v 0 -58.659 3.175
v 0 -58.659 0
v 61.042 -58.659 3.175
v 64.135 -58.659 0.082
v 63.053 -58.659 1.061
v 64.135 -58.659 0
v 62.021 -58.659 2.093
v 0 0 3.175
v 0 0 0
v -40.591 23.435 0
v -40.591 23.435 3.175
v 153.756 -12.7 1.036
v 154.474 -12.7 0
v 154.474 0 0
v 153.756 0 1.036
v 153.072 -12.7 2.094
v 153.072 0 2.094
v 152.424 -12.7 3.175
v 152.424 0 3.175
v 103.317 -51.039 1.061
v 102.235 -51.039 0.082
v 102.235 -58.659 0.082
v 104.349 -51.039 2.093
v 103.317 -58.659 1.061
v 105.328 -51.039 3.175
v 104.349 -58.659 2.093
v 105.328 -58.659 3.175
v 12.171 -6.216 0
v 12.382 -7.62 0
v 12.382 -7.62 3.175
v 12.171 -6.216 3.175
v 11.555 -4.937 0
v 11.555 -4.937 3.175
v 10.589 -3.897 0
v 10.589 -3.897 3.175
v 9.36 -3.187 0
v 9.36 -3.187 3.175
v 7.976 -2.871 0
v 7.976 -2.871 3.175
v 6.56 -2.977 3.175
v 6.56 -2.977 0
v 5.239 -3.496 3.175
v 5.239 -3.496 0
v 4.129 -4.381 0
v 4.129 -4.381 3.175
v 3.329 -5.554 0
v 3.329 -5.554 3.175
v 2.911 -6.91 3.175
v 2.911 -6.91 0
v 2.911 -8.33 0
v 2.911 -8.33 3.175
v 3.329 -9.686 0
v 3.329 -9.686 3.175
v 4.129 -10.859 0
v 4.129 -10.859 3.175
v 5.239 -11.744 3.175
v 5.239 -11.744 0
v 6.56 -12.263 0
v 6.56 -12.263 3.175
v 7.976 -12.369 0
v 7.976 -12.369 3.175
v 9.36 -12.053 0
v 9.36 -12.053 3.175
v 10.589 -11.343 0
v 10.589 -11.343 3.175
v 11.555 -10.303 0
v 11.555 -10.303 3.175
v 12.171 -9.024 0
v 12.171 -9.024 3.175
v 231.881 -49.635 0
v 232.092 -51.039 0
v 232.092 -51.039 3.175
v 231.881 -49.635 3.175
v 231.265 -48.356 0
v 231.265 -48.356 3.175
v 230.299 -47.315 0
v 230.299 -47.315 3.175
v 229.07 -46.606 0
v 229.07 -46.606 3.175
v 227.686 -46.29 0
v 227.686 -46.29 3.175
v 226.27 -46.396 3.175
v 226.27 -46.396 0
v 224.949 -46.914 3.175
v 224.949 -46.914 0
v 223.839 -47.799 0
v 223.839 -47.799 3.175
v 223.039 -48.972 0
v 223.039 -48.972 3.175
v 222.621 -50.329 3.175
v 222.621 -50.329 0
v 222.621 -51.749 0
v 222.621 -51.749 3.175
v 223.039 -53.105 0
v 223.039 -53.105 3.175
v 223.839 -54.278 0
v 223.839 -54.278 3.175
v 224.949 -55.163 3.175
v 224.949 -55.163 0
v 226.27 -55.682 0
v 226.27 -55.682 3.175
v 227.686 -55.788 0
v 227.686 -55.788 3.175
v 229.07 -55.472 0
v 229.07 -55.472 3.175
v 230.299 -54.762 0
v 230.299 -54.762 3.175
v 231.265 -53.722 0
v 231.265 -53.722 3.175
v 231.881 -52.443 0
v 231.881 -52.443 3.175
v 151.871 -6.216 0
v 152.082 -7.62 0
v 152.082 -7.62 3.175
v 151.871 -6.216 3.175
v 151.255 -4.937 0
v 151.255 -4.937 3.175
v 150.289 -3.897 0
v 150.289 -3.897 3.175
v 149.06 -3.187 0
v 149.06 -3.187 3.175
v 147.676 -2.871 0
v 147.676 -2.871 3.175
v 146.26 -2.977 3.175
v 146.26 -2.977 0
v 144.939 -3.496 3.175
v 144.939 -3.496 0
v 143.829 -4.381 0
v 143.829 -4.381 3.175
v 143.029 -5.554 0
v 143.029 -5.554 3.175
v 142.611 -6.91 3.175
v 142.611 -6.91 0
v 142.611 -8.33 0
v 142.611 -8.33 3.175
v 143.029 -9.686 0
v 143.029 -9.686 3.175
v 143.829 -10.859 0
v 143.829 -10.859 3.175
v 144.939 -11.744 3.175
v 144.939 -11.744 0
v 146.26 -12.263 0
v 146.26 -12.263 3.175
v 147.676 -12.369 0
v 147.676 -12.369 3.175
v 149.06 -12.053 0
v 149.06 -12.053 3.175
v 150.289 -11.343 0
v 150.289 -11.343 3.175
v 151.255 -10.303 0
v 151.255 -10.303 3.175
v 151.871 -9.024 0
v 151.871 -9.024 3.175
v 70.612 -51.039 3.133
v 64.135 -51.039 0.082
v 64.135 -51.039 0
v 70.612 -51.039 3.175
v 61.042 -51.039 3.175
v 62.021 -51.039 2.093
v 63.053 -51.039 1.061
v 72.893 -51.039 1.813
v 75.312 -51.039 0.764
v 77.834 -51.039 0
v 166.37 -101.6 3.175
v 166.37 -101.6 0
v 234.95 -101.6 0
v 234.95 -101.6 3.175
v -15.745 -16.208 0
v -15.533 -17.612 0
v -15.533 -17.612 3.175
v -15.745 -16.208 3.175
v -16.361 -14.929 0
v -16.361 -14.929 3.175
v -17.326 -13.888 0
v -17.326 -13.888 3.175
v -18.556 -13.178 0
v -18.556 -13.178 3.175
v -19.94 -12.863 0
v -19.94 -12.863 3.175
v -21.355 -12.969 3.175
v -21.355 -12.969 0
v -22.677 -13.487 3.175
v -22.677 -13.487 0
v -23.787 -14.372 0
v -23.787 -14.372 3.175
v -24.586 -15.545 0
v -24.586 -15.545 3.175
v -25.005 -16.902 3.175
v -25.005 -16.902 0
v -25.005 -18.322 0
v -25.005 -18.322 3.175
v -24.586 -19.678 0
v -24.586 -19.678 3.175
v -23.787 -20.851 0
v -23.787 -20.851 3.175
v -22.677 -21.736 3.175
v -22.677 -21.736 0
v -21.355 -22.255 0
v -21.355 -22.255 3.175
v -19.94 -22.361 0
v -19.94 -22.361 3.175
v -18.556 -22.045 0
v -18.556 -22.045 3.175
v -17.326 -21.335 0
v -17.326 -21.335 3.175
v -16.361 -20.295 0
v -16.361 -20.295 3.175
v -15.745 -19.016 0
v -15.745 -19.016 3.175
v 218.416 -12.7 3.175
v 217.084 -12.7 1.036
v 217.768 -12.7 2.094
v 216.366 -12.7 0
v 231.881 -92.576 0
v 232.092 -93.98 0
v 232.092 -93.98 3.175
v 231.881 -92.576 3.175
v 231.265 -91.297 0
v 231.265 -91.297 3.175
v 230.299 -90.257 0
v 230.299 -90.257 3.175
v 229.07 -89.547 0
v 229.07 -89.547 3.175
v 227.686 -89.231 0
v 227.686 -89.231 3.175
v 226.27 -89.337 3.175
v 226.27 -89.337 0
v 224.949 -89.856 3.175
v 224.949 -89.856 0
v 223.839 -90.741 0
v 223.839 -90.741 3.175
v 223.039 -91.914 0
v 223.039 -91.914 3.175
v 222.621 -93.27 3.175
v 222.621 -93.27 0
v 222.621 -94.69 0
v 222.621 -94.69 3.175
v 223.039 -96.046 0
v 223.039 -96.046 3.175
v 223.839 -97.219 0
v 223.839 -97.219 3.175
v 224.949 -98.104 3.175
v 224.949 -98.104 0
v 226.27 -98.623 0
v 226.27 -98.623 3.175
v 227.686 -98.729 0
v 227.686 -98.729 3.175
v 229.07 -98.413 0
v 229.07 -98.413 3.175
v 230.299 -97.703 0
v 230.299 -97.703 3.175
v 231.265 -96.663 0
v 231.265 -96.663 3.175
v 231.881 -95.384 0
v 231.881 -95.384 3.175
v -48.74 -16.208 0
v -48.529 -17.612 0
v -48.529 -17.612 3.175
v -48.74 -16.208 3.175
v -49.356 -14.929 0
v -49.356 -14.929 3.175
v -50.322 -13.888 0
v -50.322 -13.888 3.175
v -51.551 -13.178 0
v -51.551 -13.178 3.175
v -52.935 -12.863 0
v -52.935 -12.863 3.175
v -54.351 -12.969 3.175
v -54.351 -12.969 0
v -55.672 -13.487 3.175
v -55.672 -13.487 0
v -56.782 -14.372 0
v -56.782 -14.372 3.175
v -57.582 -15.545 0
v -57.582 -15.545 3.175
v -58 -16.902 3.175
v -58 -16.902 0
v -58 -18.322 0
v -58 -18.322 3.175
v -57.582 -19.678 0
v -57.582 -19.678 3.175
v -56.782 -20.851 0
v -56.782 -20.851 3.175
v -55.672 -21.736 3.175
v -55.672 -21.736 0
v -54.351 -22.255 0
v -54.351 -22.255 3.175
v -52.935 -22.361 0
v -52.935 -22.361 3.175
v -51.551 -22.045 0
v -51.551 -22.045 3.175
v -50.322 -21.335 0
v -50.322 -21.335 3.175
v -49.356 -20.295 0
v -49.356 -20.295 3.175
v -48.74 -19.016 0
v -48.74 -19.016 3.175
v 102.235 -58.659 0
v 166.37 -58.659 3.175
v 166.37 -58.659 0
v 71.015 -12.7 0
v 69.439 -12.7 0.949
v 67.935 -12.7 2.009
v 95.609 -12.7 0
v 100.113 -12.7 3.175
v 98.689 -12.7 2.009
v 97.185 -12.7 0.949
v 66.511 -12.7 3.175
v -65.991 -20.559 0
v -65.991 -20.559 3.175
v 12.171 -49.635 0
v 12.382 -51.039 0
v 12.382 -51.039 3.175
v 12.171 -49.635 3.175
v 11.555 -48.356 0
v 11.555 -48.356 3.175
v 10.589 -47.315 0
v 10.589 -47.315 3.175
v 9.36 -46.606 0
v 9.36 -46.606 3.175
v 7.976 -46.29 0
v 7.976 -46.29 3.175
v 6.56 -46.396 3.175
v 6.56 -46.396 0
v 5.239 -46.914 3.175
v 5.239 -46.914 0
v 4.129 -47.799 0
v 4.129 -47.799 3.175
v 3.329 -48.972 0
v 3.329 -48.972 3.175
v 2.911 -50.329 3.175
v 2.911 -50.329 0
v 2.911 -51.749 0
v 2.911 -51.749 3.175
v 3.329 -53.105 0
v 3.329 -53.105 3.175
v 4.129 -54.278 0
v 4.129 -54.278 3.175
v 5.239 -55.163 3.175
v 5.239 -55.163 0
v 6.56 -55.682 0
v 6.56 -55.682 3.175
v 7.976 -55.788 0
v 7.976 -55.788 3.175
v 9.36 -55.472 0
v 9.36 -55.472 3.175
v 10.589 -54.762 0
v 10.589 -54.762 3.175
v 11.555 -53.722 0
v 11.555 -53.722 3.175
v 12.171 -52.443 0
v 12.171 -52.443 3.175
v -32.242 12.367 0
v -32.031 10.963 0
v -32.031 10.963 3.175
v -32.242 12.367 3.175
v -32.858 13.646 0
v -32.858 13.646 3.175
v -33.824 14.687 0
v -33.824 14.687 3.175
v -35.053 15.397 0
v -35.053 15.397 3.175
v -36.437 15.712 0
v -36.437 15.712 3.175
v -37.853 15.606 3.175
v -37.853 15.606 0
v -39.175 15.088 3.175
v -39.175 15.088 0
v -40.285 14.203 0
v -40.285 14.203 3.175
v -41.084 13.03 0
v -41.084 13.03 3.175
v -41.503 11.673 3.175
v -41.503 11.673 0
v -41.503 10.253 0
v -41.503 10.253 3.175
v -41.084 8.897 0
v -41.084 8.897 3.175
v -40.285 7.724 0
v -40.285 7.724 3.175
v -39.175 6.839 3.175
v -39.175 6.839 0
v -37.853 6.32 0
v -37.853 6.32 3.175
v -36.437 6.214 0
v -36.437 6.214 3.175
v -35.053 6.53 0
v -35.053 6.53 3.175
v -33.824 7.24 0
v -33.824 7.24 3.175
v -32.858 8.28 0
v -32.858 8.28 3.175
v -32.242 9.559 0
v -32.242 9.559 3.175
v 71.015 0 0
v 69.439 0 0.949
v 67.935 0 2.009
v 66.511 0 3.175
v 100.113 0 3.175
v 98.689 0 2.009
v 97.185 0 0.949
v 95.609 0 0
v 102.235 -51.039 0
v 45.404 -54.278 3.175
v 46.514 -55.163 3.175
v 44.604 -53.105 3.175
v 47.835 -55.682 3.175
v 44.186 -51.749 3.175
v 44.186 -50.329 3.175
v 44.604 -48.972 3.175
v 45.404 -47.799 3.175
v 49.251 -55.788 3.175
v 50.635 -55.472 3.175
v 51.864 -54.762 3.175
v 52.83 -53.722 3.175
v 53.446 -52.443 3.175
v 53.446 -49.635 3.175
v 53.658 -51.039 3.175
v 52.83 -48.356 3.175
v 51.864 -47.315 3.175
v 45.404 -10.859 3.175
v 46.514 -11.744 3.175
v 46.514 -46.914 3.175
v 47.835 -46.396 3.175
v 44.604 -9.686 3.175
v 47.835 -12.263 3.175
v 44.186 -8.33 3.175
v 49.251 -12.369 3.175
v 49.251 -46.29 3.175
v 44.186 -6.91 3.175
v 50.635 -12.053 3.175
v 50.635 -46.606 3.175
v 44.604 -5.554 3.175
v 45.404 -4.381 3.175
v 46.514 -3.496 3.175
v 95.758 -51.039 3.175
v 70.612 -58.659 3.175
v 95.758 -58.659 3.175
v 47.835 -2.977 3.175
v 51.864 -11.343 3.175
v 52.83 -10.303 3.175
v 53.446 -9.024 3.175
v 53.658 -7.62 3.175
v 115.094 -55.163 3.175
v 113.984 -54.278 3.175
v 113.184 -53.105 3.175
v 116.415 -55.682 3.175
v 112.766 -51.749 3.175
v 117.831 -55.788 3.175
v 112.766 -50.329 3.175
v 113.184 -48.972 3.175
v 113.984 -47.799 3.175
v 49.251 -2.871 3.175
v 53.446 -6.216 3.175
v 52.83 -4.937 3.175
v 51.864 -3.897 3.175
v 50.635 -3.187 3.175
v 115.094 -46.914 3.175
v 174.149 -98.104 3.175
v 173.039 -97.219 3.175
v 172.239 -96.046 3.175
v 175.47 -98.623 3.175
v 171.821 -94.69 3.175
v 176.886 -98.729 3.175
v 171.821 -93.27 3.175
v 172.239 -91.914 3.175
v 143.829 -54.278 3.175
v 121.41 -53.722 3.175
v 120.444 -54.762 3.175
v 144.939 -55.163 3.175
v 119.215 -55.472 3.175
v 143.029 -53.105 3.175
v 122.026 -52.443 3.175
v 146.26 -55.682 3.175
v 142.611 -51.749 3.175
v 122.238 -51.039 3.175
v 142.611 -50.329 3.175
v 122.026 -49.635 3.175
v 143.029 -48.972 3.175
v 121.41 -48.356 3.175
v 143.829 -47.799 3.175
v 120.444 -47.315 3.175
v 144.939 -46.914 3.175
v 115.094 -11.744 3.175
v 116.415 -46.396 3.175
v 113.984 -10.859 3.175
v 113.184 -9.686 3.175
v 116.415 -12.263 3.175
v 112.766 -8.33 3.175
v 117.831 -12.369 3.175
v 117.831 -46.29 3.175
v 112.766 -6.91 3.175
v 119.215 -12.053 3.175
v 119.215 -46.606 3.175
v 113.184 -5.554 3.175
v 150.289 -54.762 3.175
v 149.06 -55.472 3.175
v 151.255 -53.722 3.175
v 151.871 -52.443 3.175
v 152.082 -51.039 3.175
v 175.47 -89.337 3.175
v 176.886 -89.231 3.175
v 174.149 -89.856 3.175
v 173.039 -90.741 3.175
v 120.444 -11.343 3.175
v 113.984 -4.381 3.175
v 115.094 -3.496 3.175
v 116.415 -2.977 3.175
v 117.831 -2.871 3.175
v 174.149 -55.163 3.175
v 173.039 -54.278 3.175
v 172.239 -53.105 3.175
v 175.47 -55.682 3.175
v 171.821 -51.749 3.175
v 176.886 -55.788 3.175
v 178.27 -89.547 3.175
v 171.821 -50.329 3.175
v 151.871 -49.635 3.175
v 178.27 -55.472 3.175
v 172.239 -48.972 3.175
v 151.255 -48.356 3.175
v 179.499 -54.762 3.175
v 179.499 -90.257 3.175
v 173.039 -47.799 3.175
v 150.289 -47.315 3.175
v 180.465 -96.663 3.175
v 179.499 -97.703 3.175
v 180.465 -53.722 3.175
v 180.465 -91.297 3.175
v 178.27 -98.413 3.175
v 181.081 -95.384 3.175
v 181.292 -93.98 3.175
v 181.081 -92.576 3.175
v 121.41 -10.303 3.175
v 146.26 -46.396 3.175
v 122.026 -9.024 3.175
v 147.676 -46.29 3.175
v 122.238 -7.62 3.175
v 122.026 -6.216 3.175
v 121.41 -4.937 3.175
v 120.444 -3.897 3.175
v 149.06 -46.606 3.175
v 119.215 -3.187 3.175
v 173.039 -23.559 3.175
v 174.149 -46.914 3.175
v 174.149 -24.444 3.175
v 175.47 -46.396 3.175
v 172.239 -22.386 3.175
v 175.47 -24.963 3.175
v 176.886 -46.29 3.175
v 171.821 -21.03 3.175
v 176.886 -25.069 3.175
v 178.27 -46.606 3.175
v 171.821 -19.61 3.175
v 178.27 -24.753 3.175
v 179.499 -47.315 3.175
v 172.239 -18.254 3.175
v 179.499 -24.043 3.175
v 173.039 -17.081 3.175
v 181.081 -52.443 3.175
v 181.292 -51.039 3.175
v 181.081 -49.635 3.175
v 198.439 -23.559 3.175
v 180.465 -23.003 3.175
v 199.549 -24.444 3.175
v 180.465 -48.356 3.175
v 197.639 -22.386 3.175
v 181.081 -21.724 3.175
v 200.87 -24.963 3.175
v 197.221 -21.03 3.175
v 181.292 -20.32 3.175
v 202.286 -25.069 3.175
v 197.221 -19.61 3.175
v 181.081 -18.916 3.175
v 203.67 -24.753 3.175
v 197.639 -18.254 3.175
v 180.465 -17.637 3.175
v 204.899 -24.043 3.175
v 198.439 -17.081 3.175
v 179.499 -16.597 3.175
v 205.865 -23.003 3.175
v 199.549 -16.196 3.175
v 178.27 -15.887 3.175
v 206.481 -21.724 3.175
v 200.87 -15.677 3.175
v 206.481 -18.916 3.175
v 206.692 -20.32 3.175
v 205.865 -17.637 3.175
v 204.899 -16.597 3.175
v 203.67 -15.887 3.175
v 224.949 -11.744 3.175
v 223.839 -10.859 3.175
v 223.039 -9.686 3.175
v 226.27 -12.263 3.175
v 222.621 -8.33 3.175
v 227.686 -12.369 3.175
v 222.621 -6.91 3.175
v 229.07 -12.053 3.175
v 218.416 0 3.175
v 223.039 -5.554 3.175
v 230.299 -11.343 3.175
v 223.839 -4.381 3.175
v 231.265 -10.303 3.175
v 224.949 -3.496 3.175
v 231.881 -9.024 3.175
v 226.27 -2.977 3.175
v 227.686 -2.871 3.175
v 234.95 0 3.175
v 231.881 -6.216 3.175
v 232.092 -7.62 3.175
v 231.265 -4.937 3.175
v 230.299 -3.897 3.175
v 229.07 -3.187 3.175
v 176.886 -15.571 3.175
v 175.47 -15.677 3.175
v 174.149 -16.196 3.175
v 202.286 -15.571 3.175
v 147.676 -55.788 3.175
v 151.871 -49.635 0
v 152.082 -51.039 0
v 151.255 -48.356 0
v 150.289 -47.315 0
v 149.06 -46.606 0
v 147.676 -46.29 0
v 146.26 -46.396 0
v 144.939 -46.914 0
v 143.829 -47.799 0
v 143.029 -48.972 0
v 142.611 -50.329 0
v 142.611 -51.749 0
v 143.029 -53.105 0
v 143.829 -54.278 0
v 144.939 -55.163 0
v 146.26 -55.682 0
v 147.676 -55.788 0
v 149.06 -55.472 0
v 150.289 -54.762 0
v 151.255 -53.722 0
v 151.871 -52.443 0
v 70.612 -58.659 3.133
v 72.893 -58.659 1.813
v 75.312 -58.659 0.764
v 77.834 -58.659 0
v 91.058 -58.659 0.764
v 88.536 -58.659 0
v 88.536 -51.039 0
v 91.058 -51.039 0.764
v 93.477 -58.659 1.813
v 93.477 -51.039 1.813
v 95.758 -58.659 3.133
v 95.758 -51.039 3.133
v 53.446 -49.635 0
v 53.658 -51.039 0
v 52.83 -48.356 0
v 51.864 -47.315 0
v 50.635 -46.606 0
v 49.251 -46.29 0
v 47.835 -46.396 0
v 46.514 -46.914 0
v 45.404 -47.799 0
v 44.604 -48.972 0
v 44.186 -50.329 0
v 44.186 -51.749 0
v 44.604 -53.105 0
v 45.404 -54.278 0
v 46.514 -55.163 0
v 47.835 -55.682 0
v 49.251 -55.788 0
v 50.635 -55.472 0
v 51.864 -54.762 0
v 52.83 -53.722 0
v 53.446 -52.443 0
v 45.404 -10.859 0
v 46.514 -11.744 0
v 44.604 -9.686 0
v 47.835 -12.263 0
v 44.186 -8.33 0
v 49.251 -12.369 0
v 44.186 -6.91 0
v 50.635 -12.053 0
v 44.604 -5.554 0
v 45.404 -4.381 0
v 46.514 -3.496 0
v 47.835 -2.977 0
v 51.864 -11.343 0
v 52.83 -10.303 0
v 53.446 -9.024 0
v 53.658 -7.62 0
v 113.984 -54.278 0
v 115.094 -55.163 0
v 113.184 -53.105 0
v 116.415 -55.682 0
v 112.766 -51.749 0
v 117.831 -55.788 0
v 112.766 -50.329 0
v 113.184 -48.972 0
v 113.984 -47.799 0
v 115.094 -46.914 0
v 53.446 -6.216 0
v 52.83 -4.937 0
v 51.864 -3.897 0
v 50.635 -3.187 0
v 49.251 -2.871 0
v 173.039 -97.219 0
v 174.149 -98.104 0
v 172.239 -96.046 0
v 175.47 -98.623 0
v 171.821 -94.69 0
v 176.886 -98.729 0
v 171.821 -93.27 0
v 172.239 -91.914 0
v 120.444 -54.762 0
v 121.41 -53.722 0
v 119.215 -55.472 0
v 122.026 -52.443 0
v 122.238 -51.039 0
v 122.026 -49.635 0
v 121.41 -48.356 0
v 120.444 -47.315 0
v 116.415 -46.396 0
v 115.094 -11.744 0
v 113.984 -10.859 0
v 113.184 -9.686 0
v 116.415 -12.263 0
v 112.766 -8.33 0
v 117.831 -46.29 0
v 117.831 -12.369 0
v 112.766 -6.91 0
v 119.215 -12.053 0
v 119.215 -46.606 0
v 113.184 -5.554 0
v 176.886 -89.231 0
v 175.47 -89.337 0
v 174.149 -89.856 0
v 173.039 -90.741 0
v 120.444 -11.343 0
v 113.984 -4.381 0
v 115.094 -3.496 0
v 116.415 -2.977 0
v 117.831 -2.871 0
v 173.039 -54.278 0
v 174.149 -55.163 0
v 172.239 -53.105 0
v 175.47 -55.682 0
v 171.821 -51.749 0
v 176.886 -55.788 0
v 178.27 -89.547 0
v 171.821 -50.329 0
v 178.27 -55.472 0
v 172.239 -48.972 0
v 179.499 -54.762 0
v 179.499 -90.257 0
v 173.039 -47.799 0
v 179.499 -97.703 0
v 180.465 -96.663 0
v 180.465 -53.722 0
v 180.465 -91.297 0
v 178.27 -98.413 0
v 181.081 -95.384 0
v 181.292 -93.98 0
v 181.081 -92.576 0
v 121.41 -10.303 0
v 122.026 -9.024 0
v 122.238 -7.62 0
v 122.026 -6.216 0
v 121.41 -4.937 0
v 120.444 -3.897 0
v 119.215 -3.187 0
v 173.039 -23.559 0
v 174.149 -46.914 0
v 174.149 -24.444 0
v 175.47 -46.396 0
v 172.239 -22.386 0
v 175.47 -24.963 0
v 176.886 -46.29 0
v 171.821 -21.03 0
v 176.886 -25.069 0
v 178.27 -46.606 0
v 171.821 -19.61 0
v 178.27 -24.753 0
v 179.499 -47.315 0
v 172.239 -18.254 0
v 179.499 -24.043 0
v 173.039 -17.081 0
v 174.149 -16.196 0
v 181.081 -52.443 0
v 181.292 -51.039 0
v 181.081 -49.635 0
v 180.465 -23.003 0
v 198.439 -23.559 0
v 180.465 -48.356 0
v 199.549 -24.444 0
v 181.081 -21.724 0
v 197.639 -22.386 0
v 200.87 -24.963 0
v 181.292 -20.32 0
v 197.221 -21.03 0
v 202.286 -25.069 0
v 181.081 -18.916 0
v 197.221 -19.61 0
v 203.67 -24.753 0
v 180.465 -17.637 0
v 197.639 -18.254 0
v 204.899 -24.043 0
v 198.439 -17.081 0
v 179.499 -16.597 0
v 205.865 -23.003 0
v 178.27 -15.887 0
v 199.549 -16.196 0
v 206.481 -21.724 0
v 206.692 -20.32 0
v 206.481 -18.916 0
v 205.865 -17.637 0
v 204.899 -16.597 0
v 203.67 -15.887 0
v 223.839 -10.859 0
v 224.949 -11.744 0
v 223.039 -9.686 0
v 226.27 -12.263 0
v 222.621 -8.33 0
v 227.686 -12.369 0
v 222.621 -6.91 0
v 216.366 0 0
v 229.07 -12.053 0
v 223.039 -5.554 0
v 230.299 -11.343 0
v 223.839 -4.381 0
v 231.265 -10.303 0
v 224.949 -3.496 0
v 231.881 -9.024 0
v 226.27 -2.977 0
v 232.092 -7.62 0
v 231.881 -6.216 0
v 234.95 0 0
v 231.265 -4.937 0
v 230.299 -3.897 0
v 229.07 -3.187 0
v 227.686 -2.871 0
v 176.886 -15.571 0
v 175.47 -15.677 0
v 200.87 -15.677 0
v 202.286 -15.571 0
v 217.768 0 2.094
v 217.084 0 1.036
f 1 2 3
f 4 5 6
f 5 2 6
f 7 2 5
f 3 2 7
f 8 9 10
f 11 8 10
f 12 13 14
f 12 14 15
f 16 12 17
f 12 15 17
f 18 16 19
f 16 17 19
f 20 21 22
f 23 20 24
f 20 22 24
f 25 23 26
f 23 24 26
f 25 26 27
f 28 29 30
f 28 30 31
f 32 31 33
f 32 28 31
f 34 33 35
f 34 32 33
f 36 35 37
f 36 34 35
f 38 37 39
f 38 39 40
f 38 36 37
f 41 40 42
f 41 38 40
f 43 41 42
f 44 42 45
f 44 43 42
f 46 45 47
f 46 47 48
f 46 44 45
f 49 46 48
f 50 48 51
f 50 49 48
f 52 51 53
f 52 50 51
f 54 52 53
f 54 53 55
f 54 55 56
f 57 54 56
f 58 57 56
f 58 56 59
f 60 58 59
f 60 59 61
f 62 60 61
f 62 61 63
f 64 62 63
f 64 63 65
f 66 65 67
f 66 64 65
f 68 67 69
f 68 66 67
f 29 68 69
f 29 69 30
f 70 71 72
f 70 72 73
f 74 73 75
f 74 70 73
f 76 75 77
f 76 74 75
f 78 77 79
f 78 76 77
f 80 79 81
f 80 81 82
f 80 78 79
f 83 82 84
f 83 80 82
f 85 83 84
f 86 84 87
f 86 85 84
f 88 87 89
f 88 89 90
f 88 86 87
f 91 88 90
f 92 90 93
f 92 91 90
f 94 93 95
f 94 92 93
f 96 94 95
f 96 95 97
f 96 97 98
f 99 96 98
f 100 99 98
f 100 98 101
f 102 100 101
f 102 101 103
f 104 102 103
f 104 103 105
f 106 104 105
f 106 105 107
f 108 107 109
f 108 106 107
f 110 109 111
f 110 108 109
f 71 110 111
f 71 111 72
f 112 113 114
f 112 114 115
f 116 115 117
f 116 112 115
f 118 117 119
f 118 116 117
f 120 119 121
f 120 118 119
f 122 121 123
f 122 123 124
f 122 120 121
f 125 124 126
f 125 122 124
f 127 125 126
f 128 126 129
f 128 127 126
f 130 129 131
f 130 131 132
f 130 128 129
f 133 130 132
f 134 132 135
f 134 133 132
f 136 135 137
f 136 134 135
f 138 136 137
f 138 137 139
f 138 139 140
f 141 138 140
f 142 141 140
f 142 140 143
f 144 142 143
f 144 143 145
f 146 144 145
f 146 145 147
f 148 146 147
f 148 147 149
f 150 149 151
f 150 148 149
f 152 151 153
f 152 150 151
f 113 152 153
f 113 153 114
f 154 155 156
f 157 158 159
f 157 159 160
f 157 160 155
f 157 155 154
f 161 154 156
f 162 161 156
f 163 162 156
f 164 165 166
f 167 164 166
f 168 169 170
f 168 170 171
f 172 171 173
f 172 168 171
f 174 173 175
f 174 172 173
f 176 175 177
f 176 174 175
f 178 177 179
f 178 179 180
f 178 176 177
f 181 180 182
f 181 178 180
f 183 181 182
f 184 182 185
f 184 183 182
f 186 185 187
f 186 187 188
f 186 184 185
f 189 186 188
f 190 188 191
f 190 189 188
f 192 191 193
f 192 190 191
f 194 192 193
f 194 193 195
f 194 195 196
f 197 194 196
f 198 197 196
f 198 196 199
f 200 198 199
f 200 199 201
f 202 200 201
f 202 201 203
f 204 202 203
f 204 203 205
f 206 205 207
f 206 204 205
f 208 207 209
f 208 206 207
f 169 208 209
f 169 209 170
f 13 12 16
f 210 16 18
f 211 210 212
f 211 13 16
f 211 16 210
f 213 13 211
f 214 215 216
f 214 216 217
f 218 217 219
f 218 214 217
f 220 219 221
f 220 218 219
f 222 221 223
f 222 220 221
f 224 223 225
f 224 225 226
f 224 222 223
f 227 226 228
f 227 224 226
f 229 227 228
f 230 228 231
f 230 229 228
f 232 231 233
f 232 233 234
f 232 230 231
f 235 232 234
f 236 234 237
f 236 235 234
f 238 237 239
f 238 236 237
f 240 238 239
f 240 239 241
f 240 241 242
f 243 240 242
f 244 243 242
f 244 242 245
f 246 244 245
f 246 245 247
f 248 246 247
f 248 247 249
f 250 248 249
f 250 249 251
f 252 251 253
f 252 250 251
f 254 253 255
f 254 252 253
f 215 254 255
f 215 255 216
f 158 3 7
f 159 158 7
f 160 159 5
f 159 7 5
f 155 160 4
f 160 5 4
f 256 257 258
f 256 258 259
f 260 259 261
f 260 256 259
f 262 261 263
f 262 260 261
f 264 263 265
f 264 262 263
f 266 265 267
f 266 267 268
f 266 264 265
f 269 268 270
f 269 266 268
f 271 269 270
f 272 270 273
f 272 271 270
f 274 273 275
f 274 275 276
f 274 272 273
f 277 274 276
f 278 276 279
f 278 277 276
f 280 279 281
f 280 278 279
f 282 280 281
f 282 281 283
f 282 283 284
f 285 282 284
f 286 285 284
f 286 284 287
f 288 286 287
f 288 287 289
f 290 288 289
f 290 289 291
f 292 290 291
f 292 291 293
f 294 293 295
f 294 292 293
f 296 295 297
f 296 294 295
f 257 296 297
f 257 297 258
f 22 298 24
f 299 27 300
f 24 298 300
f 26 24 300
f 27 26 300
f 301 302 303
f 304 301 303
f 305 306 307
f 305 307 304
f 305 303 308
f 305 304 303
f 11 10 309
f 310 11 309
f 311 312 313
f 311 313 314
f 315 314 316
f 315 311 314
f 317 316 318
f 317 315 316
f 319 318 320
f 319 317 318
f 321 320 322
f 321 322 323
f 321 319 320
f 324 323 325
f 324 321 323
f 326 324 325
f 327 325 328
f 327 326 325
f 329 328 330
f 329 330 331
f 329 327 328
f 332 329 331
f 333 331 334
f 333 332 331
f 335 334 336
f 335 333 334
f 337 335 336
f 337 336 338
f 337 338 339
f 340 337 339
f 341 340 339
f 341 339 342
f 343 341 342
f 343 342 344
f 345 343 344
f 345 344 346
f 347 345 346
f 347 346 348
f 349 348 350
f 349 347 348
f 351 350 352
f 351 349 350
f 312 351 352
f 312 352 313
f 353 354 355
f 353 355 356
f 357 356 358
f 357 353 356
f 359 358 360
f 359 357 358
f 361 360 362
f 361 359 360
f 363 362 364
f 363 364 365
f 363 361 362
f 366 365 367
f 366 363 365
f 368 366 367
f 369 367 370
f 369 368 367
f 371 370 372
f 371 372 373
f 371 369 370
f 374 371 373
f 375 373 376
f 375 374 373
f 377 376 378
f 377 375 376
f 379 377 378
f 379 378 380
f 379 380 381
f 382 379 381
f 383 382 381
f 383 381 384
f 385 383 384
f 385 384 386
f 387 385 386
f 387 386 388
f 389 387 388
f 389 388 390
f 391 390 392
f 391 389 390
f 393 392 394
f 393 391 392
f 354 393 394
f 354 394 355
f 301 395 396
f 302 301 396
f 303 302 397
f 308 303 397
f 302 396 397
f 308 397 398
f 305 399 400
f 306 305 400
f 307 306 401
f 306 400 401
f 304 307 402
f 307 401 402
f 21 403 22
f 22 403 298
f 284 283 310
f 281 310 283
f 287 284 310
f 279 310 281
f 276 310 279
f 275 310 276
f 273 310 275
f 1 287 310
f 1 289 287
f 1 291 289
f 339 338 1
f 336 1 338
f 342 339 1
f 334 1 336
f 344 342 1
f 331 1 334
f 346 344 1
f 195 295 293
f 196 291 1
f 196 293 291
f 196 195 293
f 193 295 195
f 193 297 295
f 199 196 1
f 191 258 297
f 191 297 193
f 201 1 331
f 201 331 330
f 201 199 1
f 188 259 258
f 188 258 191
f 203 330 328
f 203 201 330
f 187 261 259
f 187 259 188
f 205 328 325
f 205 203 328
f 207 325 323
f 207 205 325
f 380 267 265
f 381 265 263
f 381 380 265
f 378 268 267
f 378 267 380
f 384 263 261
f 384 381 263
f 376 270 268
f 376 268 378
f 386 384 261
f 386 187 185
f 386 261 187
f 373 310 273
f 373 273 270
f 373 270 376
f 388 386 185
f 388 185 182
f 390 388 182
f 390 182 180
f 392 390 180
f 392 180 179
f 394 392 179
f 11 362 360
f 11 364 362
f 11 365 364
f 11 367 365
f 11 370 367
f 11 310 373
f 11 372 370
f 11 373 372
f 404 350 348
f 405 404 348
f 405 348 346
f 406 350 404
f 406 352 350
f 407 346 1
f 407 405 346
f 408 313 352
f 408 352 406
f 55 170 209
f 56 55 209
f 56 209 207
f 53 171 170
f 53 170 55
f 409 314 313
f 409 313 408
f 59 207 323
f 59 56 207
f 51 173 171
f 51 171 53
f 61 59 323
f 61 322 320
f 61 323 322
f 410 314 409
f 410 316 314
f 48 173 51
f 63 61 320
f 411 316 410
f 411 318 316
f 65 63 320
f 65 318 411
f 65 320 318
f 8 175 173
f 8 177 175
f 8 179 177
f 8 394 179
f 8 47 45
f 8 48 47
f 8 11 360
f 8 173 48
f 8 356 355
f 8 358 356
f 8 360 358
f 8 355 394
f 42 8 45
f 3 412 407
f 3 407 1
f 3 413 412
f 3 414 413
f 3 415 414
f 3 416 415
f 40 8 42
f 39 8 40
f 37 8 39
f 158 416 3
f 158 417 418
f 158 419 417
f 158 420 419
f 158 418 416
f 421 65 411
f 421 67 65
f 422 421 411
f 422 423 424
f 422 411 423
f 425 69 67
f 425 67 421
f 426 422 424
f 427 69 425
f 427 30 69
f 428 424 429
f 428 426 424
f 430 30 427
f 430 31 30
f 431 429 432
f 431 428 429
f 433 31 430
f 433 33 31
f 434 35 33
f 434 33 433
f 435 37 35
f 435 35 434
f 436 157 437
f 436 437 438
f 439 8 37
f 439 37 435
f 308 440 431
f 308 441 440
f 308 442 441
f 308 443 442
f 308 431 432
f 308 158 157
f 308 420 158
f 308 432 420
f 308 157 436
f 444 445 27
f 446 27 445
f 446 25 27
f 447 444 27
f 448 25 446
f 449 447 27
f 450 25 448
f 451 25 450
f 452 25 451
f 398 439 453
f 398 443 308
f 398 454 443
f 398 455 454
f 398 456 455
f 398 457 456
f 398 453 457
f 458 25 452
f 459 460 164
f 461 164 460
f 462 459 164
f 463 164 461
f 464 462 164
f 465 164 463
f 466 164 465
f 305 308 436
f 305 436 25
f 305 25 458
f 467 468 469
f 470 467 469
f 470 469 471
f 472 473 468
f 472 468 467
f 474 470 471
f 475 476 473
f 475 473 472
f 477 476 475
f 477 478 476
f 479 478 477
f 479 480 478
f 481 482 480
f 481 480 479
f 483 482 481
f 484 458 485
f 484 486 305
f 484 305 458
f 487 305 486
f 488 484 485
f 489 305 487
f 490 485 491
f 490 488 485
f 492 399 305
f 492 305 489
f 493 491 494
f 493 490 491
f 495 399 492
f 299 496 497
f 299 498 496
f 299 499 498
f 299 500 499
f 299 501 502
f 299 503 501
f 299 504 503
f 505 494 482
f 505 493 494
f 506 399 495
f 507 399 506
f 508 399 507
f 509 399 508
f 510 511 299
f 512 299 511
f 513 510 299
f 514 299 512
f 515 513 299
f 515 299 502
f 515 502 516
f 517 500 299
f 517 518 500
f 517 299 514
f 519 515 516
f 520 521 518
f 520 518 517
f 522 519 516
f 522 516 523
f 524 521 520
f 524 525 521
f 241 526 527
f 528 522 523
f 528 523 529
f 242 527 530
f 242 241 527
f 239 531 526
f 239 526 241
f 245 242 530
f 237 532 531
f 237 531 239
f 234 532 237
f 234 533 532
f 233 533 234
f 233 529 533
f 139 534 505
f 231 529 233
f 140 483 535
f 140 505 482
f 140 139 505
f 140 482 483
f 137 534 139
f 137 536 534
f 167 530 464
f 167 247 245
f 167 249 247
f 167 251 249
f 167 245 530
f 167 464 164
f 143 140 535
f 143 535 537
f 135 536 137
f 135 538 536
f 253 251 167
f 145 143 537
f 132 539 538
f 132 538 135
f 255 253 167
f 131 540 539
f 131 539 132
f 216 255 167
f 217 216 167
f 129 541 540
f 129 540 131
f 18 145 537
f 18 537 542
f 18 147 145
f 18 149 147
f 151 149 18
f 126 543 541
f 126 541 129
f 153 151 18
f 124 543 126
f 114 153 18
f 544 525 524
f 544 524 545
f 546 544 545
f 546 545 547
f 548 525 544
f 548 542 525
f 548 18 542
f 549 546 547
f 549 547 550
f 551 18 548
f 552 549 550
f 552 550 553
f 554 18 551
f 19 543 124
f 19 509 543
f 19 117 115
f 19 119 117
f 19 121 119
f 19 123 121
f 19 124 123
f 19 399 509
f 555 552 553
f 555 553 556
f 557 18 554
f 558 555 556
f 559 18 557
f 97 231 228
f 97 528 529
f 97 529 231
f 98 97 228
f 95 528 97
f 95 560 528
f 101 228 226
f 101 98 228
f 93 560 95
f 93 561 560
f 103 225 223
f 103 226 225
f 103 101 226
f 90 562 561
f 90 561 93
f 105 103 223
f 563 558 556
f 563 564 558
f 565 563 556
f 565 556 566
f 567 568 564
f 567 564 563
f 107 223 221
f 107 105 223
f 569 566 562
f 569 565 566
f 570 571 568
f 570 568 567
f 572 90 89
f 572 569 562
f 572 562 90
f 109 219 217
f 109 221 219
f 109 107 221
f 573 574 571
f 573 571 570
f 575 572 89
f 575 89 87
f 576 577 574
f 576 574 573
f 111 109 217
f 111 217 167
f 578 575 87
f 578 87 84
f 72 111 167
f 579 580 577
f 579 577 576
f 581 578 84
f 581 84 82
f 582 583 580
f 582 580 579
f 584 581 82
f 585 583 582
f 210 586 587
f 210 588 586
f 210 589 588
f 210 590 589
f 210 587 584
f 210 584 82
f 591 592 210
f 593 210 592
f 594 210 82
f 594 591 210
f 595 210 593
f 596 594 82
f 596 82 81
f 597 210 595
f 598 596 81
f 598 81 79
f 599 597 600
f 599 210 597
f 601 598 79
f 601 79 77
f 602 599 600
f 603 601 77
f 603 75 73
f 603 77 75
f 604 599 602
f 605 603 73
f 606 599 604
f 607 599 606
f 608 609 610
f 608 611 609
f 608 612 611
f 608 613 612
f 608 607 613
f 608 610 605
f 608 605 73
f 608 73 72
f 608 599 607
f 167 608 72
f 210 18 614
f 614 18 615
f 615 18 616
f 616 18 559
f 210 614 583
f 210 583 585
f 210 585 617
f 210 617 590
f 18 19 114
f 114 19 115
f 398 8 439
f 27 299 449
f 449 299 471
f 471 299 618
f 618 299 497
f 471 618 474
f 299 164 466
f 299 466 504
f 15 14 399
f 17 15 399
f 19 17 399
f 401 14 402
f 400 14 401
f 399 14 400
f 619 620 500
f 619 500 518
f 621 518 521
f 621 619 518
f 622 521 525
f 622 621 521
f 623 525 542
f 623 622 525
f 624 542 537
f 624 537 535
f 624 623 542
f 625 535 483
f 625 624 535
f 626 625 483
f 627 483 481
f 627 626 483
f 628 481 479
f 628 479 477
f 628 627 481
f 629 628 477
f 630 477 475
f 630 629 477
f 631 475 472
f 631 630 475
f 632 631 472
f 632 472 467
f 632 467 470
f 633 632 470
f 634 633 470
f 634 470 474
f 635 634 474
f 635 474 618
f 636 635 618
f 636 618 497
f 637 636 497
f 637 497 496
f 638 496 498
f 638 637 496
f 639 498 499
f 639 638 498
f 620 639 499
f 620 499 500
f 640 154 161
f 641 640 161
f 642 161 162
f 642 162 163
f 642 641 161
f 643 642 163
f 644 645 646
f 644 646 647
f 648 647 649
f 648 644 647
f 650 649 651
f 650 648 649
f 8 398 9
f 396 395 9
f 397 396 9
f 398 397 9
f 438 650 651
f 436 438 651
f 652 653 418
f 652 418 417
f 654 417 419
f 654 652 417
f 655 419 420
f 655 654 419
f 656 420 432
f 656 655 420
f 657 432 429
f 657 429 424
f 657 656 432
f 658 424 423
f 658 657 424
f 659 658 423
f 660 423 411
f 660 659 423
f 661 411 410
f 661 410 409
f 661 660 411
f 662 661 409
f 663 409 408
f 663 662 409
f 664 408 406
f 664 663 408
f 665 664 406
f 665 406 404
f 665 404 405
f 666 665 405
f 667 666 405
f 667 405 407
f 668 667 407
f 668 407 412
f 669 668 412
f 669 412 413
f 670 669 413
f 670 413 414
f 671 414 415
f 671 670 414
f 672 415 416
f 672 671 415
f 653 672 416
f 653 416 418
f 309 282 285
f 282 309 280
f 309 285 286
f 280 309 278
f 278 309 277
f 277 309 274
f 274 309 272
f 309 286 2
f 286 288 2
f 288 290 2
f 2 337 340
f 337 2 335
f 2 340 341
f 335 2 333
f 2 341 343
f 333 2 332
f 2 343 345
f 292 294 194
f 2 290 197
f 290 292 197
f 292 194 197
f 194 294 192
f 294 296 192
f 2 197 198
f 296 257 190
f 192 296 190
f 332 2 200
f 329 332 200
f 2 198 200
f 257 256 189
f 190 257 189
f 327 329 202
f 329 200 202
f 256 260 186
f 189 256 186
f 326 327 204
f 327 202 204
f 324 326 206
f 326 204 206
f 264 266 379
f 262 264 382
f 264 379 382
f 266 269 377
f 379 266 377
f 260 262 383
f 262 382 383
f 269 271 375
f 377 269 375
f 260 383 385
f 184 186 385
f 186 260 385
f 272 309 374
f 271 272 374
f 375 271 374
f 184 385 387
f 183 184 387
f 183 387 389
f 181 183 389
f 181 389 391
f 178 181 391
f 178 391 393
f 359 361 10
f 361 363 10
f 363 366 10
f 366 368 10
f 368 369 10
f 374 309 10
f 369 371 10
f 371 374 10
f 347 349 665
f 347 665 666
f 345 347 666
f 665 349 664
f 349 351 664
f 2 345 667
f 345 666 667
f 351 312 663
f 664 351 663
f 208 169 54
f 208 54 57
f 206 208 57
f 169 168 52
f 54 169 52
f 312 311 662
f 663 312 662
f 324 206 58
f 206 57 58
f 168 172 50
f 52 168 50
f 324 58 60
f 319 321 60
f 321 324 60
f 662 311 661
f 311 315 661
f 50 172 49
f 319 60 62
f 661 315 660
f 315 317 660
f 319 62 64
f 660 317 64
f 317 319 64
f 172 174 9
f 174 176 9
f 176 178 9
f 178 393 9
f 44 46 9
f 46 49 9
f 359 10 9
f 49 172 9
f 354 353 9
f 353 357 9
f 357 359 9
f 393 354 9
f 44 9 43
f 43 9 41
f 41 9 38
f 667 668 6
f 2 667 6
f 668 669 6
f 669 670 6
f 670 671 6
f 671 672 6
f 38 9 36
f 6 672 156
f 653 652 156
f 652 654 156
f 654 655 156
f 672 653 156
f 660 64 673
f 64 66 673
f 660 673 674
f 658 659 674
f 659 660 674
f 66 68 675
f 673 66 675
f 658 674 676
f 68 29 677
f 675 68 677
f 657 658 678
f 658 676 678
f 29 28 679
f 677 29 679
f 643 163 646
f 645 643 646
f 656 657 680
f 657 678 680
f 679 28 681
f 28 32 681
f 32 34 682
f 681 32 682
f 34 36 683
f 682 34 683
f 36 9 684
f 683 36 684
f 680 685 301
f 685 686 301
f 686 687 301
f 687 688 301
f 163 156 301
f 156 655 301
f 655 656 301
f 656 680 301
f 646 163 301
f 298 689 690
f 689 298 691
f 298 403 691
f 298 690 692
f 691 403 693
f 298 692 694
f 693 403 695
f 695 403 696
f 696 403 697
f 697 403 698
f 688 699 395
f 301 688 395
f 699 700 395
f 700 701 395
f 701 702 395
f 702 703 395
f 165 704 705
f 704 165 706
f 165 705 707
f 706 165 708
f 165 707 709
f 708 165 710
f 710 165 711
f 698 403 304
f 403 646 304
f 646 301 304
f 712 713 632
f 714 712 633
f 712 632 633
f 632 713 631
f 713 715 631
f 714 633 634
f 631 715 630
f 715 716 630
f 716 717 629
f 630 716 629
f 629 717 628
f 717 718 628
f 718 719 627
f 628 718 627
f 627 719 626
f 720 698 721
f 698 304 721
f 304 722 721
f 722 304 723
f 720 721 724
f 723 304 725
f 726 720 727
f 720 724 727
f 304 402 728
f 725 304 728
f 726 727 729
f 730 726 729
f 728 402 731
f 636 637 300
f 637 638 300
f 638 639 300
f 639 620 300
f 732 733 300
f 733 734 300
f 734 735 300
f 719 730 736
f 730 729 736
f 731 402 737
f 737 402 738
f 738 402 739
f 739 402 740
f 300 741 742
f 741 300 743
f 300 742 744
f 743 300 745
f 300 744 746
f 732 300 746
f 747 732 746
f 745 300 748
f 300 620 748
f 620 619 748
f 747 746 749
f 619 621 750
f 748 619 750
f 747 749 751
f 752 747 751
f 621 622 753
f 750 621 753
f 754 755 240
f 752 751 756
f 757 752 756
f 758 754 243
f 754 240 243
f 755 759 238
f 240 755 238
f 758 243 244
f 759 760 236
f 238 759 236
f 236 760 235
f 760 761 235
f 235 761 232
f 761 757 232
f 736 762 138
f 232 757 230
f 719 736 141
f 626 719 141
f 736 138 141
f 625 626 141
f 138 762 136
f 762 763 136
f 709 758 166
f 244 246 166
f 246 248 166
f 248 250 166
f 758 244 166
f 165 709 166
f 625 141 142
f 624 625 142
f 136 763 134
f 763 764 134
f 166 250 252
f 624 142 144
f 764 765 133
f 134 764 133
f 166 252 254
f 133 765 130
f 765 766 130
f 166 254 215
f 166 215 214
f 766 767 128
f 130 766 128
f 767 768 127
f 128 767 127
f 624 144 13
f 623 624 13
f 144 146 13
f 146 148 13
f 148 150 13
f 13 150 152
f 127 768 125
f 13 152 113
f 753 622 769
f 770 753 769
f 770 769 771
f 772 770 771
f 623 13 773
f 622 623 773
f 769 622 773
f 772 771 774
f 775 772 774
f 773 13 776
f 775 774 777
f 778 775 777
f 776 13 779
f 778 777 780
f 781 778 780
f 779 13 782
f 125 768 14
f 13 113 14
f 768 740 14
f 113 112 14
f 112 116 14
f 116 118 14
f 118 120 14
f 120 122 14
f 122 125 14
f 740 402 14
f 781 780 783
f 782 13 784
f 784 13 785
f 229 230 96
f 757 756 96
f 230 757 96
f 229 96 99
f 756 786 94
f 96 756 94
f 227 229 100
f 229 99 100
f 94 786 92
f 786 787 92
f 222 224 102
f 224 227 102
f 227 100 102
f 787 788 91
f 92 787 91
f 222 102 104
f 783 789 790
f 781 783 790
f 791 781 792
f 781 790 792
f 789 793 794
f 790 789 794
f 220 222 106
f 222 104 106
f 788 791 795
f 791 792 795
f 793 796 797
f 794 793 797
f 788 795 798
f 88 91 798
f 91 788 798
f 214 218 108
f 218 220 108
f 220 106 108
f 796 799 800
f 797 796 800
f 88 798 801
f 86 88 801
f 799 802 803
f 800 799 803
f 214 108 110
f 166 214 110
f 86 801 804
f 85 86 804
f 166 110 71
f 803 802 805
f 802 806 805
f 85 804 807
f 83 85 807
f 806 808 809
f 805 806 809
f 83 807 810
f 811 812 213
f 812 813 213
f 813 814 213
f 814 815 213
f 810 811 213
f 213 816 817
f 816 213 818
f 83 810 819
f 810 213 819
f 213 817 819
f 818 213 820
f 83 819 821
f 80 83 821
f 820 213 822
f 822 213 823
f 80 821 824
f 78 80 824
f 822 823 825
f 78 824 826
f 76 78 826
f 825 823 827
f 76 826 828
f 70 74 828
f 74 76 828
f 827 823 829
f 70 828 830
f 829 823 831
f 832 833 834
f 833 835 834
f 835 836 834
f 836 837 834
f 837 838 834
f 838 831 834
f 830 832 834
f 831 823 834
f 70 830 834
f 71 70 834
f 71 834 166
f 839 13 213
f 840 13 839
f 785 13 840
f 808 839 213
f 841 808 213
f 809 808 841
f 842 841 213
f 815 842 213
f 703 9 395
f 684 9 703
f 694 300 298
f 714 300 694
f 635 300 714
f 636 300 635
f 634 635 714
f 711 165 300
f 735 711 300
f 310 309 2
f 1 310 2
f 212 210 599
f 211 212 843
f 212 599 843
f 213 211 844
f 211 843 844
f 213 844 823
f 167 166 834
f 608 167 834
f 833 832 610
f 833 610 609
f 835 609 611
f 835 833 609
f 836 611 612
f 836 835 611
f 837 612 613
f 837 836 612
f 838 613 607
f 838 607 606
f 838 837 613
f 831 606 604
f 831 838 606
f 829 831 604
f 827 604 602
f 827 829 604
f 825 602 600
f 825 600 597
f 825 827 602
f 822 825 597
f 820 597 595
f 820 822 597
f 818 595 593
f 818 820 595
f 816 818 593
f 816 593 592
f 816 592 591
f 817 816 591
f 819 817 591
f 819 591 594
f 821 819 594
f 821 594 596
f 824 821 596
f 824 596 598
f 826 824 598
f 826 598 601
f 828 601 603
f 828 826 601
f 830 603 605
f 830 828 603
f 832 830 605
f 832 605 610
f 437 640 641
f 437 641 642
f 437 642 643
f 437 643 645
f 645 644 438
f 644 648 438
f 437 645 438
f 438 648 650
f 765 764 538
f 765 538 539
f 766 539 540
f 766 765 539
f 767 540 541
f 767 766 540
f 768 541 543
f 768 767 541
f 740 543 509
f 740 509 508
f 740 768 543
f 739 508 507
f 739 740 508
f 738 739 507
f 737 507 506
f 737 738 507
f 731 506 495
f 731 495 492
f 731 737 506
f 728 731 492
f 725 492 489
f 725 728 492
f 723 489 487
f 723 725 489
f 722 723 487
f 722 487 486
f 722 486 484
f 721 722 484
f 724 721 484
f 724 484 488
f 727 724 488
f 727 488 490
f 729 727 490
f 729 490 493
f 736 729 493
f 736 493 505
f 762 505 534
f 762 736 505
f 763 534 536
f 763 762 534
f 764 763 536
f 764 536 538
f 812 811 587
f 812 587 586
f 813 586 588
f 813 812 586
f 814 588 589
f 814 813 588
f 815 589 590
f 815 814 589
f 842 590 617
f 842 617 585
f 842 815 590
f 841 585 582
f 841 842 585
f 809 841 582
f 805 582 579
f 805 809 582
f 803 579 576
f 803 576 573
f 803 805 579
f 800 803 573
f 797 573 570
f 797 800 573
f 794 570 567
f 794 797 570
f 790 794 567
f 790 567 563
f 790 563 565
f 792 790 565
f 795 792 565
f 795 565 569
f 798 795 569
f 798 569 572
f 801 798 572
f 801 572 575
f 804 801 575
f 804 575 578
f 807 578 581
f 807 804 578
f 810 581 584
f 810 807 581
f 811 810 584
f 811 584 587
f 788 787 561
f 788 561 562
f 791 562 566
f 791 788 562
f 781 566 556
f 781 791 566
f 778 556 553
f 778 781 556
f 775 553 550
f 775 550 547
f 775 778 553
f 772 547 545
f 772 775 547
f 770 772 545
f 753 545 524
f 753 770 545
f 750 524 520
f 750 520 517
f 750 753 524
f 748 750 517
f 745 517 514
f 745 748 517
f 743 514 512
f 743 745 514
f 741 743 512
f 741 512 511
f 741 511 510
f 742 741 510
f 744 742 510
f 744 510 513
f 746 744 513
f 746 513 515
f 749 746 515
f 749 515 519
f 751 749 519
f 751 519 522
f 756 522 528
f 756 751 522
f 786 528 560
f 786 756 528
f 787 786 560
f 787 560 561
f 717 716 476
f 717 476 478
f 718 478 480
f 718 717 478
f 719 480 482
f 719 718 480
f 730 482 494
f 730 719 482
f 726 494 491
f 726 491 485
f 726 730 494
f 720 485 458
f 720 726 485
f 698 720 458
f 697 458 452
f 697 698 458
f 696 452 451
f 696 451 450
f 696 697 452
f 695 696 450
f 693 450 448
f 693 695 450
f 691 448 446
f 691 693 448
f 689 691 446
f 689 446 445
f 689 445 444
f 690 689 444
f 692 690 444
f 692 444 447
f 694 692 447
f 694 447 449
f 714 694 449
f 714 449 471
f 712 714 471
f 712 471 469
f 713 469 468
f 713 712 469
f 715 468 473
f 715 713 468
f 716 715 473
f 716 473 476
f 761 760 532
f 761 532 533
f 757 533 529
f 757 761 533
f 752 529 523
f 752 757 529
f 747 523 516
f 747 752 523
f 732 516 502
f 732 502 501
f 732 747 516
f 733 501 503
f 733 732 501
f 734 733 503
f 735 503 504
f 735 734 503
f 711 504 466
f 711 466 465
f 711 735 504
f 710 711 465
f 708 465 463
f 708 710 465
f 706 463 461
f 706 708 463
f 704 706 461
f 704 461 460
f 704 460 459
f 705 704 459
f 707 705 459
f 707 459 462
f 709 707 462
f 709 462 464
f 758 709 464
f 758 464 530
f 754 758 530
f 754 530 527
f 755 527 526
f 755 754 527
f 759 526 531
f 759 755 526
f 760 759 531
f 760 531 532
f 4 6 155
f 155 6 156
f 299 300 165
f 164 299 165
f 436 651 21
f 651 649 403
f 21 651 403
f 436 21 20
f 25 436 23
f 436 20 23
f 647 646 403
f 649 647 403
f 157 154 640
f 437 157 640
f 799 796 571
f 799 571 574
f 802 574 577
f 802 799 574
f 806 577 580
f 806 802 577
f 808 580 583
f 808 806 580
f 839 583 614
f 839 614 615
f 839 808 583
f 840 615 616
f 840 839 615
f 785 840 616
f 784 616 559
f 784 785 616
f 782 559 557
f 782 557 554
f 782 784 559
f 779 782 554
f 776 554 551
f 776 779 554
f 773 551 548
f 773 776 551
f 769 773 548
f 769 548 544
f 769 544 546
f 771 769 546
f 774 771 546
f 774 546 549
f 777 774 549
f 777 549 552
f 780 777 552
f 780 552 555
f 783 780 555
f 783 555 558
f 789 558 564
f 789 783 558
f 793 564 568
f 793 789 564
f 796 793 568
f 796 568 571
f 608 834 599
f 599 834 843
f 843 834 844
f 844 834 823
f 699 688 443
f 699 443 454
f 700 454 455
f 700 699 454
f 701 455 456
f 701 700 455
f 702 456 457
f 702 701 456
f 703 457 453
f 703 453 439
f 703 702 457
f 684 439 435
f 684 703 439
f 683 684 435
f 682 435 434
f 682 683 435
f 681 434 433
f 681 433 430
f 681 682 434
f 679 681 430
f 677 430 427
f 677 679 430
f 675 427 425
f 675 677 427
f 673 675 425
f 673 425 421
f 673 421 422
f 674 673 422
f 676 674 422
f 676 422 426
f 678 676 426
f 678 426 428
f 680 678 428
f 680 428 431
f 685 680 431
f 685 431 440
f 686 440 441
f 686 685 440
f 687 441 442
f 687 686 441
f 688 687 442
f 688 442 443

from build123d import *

# Parameters (mm, degrees)
SKETCH1_R           = 4.7625
BOSS_EXTRUDE1_DEPTH = 3.175
SKETCH2_R           = 29.21
SKETCH2_R_2         = 22.86
CUT_EXTRUDE1_DEPTH  = 7.62
SKETCH5_R           = 38.1
SKETCH5_R_2         = 25.4
CUT_EXTRUDE5_DEPTH  = 12.7


with BuildPart() as part:
    # Sketch1 → Boss-Extrude1 (new body)
    with BuildSketch(Plane.XY):
        Polygon((0, 0), (-40.591135768, 23.435303163), (-65.991135768, -20.55878735), (0, -58.65878735), (64.135, -58.65878735), (64.135, -51.03878735), (70.612, -51.03878735), (70.612, -58.65878735), (95.758, -58.65878735), (95.758, -51.03878735), (102.235, -51.03878735), (102.235, -58.65878735), (166.37, -58.65878735), (166.37, -101.6), (234.95, -101.6), (234.95, 0), align=None)
        with Locations((-20.295567884, -17.611742094)):
            Circle(SKETCH1_R, mode=Mode.SUBTRACT)
        with Locations((-53.291135768, -17.611742094)):
            Circle(SKETCH1_R, mode=Mode.SUBTRACT)
        with Locations((-36.793351826, 10.963257906)):
            Circle(SKETCH1_R, mode=Mode.SUBTRACT)
        with Locations((7.62, -51.03878735)):
            Circle(SKETCH1_R, mode=Mode.SUBTRACT)
        with Locations((7.62, -7.62)):
            Circle(SKETCH1_R, mode=Mode.SUBTRACT)
        with Locations((48.895, -7.62)):
            Circle(SKETCH1_R, mode=Mode.SUBTRACT)
        with Locations((117.475, -7.62)):
            Circle(SKETCH1_R, mode=Mode.SUBTRACT)
        with Locations((147.32, -7.62)):
            Circle(SKETCH1_R, mode=Mode.SUBTRACT)
        with Locations((117.475, -51.03878735)):
            Circle(SKETCH1_R, mode=Mode.SUBTRACT)
        with Locations((48.895, -51.03878735)):
            Circle(SKETCH1_R, mode=Mode.SUBTRACT)
        with Locations((147.32, -51.03878735)):
            Circle(SKETCH1_R, mode=Mode.SUBTRACT)
        with Locations((176.53, -20.32)):
            Circle(SKETCH1_R, mode=Mode.SUBTRACT)
        with Locations((201.93, -20.32)):
            Circle(SKETCH1_R, mode=Mode.SUBTRACT)
        with Locations((227.33, -7.62)):
            Circle(SKETCH1_R, mode=Mode.SUBTRACT)
        with Locations((227.33, -93.98)):
            Circle(SKETCH1_R, mode=Mode.SUBTRACT)
        with Locations((176.53, -93.98)):
            Circle(SKETCH1_R, mode=Mode.SUBTRACT)
        with Locations((227.33, -51.03878735)):
            Circle(SKETCH1_R, mode=Mode.SUBTRACT)
        with Locations((176.53, -51.03878735)):
            Circle(SKETCH1_R, mode=Mode.SUBTRACT)
    extrude(amount=BOSS_EXTRUDE1_DEPTH)

    # Sketch2 → Cut-Extrude1 (cut)
    with BuildSketch(Plane.XZ.offset(58.65878735)):
        with Locations((83.185, 22.225)):
            Circle(SKETCH2_R)
        with Locations((83.185, 22.225)):
            Circle(SKETCH2_R_2, mode=Mode.SUBTRACT)
    extrude(amount=-CUT_EXTRUDE1_DEPTH, mode=Mode.SUBTRACT)

    # Sketch5 → Cut-Extrude5 (cut)
    with BuildSketch(Plane(origin=(0, 0, 0), x_dir=(1, 0, 0), z_dir=(0, 1, 0))):
        with Locations((185.42, -22.225)):
            Circle(SKETCH5_R)
        with Locations((83.312, -22.225)):
            Circle(SKETCH5_R_2)
    extrude(amount=-CUT_EXTRUDE5_DEPTH, mode=Mode.SUBTRACT)


solid = part.part
